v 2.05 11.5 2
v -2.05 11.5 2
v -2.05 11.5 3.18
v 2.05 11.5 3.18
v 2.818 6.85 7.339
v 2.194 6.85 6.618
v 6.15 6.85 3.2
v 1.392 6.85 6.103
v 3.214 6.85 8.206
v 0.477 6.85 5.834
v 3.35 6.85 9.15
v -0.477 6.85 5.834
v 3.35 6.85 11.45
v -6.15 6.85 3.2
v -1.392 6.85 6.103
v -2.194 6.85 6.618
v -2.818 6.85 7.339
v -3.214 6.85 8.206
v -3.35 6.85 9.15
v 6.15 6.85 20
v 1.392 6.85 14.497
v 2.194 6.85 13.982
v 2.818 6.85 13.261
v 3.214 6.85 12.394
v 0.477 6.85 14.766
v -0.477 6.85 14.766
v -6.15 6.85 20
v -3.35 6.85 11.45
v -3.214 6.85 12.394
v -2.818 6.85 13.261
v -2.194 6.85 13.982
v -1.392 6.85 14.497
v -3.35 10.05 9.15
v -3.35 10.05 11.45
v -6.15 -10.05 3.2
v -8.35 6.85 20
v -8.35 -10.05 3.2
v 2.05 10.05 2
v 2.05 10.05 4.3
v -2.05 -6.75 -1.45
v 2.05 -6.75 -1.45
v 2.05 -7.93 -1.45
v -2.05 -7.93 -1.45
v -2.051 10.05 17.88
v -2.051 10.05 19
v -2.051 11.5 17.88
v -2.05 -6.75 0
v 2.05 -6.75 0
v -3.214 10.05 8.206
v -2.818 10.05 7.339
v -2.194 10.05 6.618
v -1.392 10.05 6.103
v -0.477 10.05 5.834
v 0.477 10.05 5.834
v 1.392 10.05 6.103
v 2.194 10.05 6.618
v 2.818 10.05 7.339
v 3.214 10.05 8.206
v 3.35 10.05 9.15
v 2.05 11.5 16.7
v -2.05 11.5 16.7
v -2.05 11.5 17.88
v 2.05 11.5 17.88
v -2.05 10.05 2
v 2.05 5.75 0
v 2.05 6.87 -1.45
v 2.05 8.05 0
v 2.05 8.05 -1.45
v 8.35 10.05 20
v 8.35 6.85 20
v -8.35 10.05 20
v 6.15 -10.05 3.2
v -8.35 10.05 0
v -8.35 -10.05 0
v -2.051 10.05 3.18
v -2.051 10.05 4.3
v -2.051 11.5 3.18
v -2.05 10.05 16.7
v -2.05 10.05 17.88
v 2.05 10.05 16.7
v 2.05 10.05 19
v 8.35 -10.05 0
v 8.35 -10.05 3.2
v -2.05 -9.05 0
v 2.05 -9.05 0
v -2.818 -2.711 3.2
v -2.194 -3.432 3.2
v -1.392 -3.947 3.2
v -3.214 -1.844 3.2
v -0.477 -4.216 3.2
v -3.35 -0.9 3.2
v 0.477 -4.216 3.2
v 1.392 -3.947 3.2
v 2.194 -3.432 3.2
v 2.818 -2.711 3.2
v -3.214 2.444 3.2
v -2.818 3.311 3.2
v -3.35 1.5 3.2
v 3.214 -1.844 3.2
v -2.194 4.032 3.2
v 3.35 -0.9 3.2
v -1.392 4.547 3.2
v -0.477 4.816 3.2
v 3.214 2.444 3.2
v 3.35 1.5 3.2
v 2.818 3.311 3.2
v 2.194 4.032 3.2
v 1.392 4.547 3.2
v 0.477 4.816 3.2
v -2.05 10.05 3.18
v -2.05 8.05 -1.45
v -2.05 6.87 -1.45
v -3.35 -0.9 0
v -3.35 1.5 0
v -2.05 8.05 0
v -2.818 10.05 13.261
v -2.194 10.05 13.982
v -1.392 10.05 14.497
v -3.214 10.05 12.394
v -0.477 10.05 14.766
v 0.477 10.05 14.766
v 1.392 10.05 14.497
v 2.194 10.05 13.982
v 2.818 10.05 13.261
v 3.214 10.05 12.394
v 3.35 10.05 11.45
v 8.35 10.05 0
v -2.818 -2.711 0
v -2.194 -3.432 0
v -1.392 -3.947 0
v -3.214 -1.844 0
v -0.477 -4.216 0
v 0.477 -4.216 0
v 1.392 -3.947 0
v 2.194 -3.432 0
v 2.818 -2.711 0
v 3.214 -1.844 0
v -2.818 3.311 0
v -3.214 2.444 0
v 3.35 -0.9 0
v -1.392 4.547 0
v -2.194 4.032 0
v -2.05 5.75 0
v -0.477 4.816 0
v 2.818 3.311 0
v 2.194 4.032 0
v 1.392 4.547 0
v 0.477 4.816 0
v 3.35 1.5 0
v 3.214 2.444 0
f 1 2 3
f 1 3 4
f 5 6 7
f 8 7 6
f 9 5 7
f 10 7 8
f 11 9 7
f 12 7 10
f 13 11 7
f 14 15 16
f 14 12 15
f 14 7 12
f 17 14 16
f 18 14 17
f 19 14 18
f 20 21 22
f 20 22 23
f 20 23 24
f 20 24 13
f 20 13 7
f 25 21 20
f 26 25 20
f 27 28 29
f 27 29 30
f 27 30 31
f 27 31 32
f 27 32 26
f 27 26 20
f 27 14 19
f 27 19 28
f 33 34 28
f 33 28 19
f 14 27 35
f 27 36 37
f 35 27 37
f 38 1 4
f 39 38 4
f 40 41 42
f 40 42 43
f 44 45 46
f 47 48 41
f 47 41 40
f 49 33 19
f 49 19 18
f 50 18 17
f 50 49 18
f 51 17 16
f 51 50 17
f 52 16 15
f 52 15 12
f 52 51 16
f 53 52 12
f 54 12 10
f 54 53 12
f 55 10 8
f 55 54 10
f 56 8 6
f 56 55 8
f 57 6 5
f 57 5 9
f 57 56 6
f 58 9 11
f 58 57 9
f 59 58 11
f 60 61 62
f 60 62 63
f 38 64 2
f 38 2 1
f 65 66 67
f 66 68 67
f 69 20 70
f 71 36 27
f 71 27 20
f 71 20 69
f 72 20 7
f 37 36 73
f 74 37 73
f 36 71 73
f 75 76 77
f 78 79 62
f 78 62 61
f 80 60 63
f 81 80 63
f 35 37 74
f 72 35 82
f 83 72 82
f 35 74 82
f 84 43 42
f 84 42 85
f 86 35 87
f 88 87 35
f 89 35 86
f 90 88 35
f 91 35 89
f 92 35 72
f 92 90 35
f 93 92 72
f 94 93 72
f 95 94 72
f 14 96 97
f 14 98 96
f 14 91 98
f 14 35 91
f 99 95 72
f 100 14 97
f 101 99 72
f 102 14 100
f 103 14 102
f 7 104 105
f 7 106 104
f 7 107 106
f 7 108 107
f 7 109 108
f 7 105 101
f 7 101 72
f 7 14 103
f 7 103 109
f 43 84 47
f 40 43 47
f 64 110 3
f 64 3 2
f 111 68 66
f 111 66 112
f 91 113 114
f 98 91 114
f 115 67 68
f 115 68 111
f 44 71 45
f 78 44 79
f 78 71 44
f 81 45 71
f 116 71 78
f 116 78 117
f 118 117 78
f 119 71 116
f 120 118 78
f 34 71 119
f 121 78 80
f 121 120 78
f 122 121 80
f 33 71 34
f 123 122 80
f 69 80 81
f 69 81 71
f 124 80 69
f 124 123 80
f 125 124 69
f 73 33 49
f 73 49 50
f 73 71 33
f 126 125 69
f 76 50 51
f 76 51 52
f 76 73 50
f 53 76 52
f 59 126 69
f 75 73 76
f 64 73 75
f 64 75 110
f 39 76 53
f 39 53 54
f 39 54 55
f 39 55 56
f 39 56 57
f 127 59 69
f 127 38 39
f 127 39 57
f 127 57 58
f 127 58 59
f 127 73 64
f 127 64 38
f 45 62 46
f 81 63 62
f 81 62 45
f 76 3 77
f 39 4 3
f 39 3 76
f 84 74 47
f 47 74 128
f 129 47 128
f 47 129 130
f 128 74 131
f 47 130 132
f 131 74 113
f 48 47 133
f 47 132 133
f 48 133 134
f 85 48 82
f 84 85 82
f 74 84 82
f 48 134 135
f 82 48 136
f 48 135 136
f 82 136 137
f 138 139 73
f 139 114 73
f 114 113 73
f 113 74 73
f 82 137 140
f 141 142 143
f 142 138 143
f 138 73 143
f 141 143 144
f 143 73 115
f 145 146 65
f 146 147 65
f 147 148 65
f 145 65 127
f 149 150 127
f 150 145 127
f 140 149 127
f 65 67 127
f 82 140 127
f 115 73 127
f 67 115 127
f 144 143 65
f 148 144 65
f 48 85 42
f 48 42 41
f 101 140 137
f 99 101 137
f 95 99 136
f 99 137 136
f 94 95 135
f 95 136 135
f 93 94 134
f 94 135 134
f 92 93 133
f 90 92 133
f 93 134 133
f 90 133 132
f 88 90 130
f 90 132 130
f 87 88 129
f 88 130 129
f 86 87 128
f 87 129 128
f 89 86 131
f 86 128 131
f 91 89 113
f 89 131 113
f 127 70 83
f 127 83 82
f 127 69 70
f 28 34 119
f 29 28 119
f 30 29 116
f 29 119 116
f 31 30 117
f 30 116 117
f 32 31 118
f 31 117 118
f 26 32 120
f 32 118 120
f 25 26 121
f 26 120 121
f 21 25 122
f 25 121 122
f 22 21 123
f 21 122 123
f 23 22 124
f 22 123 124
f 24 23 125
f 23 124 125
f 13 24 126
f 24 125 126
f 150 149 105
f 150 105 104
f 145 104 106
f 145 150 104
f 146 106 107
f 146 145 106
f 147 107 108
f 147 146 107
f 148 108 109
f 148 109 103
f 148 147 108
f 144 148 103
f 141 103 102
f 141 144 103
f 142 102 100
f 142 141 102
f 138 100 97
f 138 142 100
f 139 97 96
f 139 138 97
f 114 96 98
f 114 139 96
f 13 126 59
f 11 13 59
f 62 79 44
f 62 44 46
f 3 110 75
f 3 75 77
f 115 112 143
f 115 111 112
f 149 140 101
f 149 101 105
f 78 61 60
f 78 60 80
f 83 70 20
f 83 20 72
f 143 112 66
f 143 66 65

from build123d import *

# Parameters (mm, degrees)
CROQUIS1_W               = 16.7
CROQUIS1_H               = 20.1
SALIENTE_EXTRUIR1_DEPTH  = 3.2
CROQUIS2_W               = 20
CROQUIS2_H               = 3.2
SALIENTE_EXTRUIR2_DEPTH  = 16.7
SALIENTE_EXTRUIR3_DEPTH  = 2.2
SALIENTE_EXTRUIR4_DEPTH  = 2.2
CROQUIS5_W               = 6.7
CROQUIS5_H               = 2.4
CORTAR_EXTRUIR1_DEPTH    = 3.2
CROQUIS6_W               = 6.7
CROQUIS6_H               = 2.3
CORTAR_EXTRUIR2_DEPTH    = 3.2
CROQUIS7_W               = 4.1
CROQUIS7_H               = 1.18
SALIENTE_EXTRUIR9_DEPTH  = 1.45
SALIENTE_EXTRUIR10_DEPTH = 4.1
CROQUIS10_W              = 4.098890586
CROQUIS10_H              = 1.18
SALIENTE_EXTRUIR13_DEPTH = 1.45
SALIENTE_EXTRUIR14_DEPTH = 4.1
SALIENTE_EXTRUIR16_DEPTH = 4.1


with BuildPart() as part:
    # Croquis1 → Saliente-Extruir1 (new body)
    with BuildSketch(Plane.XY):
        Rectangle(CROQUIS1_W, CROQUIS1_H)
    extrude(amount=SALIENTE_EXTRUIR1_DEPTH)

    # Croquis2 → Saliente-Extruir2 (add)
    with BuildSketch(Plane.ZY.offset(8.35)):
        with Locations((10, 8.45)):
            Rectangle(CROQUIS2_W, CROQUIS2_H)
    extrude(amount=-SALIENTE_EXTRUIR2_DEPTH)

    # Croquis3 → Saliente-Extruir3 (add)
    with BuildSketch(Plane.ZY.offset(8.35)):
        Polygon((20, 6.85), (3.2, -10.05), (3.2, 6.85), align=None)
    extrude(amount=-SALIENTE_EXTRUIR3_DEPTH)

    # Croquis4 → Saliente-Extruir4 (add)
    with BuildSketch(Plane(origin=(8.35, 0, 0), x_dir=(0, 0, -1), z_dir=(1, 0, 0))):
        Polygon((-20, 6.85), (-3.2, -10.05), (-3.2, 6.85), align=None)
    extrude(amount=-SALIENTE_EXTRUIR4_DEPTH)

    # Croquis5 → Cortar-Extruir1 (cut)
    with BuildSketch(Plane(origin=(0, 0, 0), x_dir=(-1, 0, 0), z_dir=(0, 0, -1))):
        with BuildLine():
            ThreePointArc((-3.35, 1.5), (0, 4.85), (3.35, 1.5))
            Line((3.35, 1.5), (-3.35, 1.5))
        make_face()
        with Locations((0, 0.3)):
            Rectangle(CROQUIS5_W, CROQUIS5_H)
        with BuildLine():
            Line((3.35, -0.9), (-3.35, -0.9))
            ThreePointArc((-3.35, -0.9), (0, -4.25), (3.35, -0.9))
        make_face()
    extrude(amount=-CORTAR_EXTRUIR1_DEPTH, mode=Mode.SUBTRACT)

    # Croquis6 → Cortar-Extruir2 (cut)
    with BuildSketch(Plane(origin=(0, 10.05, 0), x_dir=(1, 0, 0), z_dir=(0, 1, 0))):
        with BuildLine():
            ThreePointArc((-3.35, -9.15), (0, -5.8), (3.35, -9.15))
            Line((3.35, -9.15), (-3.35, -9.15))
        make_face()
        with Locations((0, -10.3)):
            Rectangle(CROQUIS6_W, CROQUIS6_H)
        with BuildLine():
            Line((3.35, -11.45), (-3.35, -11.45))
            ThreePointArc((-3.35, -11.45), (0, -14.8), (3.35, -11.45))
        make_face()
    extrude(amount=-CORTAR_EXTRUIR2_DEPTH, mode=Mode.SUBTRACT)

    # Croquis7 → Saliente-Extruir9 (add)
    with BuildSketch(Plane(origin=(0, 0, 0), x_dir=(-1, 0, 0), z_dir=(0, 0, -1))):
        with Locations((0, 7.46)):
            Rectangle(CROQUIS7_W, CROQUIS7_H)
        with Locations((0, -7.34)):
            Rectangle(CROQUIS7_W, CROQUIS7_H)
    extrude(amount=SALIENTE_EXTRUIR9_DEPTH)

    # Croquis9 → Saliente-Extruir10 (add)
    with BuildSketch(Plane.ZY.offset(2.05)):
        Polygon((-1.45, 6.87), (0, 5.75), (0, 6.87), align=None)
        Polygon((-1.45, -7.93), (0, -9.05), (0, -7.93), align=None)
    extrude(amount=-SALIENTE_EXTRUIR10_DEPTH)

    # Croquis10 → Saliente-Extruir13 (add)
    with BuildSketch(Plane(origin=(0, 10.05, 0), x_dir=(1, 0, 0), z_dir=(0, 1, 0))):
        with Locations((-0.000554707, -2.59)):
            Rectangle(CROQUIS10_W, CROQUIS10_H)
        with Locations((-0.000554707, -17.29)):
            Rectangle(CROQUIS10_W, CROQUIS10_H)
    extrude(amount=SALIENTE_EXTRUIR13_DEPTH)

    # Croquis12 → Saliente-Extruir14 (add)
    with BuildSketch(Plane(origin=(2.048890586, 0, 0), x_dir=(0, 0, -1), z_dir=(1, 0, 0))):
        Polygon((-17.88, 11.5), (-19, 10.05), (-17.88, 10.05), align=None)
        Polygon((-3.18, 11.5), (-4.3, 10.05), (-3.18, 10.05), align=None)
    extrude(amount=-SALIENTE_EXTRUIR14_DEPTH)

    # Croquis13 → Saliente-Extruir16 (add)
    with BuildSketch(Plane.ZY.offset(2.05)):
        Polygon((2, 11.5), (2, 10.05), (4.3, 10.05), (3.18, 11.5), align=None)
        Polygon((16.7, 11.5), (16.7, 10.05), (19, 10.05), (17.88, 11.5), align=None)
    extrude(amount=-SALIENTE_EXTRUIR16_DEPTH)


solid = part.part
